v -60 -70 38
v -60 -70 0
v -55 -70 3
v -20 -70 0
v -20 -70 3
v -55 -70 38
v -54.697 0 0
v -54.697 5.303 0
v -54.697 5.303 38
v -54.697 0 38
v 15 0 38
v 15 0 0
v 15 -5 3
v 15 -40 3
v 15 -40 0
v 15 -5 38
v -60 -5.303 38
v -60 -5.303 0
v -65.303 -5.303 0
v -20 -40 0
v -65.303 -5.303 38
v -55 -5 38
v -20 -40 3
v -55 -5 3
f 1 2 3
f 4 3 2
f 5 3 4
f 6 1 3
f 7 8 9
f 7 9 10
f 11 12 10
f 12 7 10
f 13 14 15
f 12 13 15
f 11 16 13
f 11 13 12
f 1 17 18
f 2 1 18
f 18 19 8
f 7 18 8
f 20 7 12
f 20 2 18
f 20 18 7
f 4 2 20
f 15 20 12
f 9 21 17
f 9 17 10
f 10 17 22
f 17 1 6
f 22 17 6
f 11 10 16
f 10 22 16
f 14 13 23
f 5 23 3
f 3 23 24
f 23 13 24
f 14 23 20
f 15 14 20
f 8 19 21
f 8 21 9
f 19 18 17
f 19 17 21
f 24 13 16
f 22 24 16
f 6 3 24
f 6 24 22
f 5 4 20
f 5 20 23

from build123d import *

# Parameters (mm, degrees)
F1_DEPTH = 70
F2_W     = 5
F2_H     = 35
F3_DEPTH = 70
F6_DEPTH = 38


with BuildPart() as f1:
    # F0 (on Front) → F1 (new body)
    with BuildSketch(Plane.XZ):
        Polygon((-55, 38), (-60, 38), (-60, 0), (-20, 0), (-20, 3), (-55, 3), align=None)
    extrude(amount=F1_DEPTH)


with BuildPart() as f3:
    # F2 (on face) → F3 (new body)
    with BuildSketch(Plane.YZ.offset(-55)):
        with Locations((-2.5, 20.5)):
            Rectangle(F2_W, F2_H)
        Polygon((-40, 0), (0, 0), (0, 3), (-5, 3), (-40, 3), align=None)
    extrude(amount=F3_DEPTH)


with BuildPart() as f1_1:
    add(f1.part)

    # F4: union F3
    add(f3.part)

    # F5 (on face) → F6 (join, through all)
    with BuildSketch(Plane(origin=(0, 0, 0), x_dir=(1, 0, 0), z_dir=(0, 0, -1))):
        Polygon((-60, 5.303301), (-65.303301, 5.303301), (-60, 0), align=None)
        Polygon((-54.696699, 0), (-60, 0), (-54.696699, -5.303301), align=None)
    extrude(amount=-F6_DEPTH)


solid = f1_1.part
